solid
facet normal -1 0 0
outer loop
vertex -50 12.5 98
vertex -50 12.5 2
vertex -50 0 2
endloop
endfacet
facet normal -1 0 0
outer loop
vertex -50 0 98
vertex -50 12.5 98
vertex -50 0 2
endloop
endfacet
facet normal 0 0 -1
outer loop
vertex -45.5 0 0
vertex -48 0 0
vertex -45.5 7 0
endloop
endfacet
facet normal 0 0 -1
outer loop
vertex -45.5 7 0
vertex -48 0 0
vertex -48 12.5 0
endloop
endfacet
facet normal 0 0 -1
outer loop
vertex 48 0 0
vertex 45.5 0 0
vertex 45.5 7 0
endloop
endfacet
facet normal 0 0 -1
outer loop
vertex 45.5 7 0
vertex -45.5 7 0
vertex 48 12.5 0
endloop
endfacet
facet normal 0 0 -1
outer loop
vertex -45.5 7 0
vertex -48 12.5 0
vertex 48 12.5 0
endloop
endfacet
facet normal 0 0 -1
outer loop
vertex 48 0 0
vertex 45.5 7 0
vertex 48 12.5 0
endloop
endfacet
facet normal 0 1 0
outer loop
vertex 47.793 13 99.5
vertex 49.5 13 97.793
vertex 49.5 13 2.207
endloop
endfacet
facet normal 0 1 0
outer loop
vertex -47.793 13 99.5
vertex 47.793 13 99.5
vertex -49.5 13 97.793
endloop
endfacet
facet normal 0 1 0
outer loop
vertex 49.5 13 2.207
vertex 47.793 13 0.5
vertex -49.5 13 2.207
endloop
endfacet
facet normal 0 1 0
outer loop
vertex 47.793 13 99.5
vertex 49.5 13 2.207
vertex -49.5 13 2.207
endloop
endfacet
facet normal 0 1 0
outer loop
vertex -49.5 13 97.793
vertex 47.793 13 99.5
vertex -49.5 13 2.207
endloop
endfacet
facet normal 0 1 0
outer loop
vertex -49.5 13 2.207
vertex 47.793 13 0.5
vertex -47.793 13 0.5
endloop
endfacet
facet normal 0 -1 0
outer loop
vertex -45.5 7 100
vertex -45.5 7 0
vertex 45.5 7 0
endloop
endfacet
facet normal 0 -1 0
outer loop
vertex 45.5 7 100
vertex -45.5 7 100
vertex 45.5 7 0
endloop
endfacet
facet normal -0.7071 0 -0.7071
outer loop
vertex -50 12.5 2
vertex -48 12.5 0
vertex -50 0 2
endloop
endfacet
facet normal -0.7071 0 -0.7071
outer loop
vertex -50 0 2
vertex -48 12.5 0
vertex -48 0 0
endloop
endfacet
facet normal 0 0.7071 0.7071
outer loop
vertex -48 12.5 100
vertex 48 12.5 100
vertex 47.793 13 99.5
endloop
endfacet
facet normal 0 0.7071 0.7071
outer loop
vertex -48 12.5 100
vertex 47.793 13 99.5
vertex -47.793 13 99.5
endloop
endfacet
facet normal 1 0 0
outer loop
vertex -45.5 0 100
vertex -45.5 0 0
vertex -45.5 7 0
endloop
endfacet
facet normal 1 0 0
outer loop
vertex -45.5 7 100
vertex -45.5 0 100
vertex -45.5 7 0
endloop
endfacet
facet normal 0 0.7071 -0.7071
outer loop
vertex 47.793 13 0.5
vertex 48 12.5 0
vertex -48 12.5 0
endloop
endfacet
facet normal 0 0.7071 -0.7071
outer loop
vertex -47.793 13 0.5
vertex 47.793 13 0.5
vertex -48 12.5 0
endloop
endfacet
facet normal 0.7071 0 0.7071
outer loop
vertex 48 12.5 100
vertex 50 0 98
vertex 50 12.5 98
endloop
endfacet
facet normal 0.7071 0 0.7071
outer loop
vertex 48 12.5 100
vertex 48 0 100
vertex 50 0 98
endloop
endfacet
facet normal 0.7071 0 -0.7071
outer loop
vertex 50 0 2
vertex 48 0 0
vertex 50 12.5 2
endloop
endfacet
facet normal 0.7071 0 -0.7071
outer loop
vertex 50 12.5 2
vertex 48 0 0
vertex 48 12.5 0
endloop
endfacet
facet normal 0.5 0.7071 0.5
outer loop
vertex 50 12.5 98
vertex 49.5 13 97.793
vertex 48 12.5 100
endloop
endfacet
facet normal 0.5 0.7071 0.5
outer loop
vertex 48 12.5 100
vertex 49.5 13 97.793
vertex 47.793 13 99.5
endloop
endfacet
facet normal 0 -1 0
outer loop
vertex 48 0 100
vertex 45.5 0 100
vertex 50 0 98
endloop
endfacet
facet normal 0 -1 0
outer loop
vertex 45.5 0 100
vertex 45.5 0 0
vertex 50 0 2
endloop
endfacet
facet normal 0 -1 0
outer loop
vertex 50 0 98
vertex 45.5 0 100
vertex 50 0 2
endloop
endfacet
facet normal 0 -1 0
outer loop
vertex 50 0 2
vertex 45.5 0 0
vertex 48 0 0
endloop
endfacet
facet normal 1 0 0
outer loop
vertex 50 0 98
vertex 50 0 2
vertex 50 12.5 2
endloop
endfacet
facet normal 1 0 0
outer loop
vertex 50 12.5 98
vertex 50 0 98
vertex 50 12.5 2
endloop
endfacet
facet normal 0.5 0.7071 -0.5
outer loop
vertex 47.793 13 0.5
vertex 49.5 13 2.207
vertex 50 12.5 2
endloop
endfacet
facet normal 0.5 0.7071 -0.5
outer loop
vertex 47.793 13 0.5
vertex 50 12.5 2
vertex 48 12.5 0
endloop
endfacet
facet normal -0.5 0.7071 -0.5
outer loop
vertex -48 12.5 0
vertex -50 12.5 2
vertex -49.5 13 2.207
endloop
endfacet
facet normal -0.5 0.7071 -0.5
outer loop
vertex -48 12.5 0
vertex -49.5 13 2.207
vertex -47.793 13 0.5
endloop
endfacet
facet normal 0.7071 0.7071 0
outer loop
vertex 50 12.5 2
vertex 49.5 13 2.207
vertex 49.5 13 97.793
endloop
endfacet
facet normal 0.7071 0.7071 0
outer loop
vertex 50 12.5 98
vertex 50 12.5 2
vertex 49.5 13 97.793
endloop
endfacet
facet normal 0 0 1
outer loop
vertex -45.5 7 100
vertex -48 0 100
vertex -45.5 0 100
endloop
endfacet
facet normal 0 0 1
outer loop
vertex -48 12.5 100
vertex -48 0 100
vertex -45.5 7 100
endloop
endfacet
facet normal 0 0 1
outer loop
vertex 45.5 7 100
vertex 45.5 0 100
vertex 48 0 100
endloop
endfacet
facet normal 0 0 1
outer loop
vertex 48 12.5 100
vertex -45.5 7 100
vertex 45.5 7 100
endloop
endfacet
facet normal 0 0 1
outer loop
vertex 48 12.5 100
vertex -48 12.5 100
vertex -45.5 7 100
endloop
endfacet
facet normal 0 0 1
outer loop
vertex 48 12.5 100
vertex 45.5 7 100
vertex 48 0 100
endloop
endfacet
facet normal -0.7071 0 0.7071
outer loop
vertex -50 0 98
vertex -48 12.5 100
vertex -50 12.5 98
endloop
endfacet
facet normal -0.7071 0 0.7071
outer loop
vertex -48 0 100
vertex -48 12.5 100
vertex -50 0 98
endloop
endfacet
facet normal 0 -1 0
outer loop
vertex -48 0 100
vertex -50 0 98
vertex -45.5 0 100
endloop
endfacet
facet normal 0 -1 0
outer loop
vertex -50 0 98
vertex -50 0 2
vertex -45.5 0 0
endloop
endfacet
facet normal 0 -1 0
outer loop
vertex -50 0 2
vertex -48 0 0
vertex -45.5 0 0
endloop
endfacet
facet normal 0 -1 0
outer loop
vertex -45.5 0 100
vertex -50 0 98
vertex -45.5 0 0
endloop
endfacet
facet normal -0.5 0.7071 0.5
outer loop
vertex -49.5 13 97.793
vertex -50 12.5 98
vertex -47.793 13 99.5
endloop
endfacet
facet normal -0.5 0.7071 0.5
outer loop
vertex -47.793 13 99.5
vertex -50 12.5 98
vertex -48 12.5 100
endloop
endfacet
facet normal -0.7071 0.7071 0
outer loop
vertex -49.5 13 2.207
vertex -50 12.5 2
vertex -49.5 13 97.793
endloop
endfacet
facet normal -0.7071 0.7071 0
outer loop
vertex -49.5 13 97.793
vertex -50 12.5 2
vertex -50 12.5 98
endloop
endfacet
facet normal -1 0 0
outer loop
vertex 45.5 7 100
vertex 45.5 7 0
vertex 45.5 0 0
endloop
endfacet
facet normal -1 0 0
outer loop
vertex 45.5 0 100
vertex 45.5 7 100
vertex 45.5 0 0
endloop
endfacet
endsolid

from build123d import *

# Parameters (mm, degrees)
BOSS_EXTRUDE1_DEPTH = 100
CHAMFER1_SIZE       = 2
CHAMFER2_SIZE       = 0.5


with BuildPart() as part:
    # Sketch1 → Boss-Extrude1 (new body)
    with BuildSketch(Plane.XY):
        Polygon((50, 0), (50, 13), (-50, 13), (-50, 0), (-45.5, 0), (-45.5, 7), (45.5, 7), (45.5, 0), align=None)
    extrude(amount=BOSS_EXTRUDE1_DEPTH)

    # Chamfer1
    chamfer1_edges = [part.edges().sort_by_distance(p)[0] for p in [
        (-50, 6.5, 0),
        (50, 6.5, 100),
        (50, 6.5, 0),
        (-50, 6.5, 100),
    ]]
    chamfer(chamfer1_edges, length=CHAMFER1_SIZE)

    # Chamfer2
    chamfer2_edges = [part.edges().sort_by_distance(p)[0] for p in [
        (-50, 13, 50),
        (0, 13, 0),
        (0, 13, 100),
        (50, 13, 50),
        (-49, 13, 99),
        (49, 13, 99),
        (49, 13, 1),
        (-49, 13, 1),
    ]]
    chamfer(chamfer2_edges, length=CHAMFER2_SIZE)


solid = part.part
